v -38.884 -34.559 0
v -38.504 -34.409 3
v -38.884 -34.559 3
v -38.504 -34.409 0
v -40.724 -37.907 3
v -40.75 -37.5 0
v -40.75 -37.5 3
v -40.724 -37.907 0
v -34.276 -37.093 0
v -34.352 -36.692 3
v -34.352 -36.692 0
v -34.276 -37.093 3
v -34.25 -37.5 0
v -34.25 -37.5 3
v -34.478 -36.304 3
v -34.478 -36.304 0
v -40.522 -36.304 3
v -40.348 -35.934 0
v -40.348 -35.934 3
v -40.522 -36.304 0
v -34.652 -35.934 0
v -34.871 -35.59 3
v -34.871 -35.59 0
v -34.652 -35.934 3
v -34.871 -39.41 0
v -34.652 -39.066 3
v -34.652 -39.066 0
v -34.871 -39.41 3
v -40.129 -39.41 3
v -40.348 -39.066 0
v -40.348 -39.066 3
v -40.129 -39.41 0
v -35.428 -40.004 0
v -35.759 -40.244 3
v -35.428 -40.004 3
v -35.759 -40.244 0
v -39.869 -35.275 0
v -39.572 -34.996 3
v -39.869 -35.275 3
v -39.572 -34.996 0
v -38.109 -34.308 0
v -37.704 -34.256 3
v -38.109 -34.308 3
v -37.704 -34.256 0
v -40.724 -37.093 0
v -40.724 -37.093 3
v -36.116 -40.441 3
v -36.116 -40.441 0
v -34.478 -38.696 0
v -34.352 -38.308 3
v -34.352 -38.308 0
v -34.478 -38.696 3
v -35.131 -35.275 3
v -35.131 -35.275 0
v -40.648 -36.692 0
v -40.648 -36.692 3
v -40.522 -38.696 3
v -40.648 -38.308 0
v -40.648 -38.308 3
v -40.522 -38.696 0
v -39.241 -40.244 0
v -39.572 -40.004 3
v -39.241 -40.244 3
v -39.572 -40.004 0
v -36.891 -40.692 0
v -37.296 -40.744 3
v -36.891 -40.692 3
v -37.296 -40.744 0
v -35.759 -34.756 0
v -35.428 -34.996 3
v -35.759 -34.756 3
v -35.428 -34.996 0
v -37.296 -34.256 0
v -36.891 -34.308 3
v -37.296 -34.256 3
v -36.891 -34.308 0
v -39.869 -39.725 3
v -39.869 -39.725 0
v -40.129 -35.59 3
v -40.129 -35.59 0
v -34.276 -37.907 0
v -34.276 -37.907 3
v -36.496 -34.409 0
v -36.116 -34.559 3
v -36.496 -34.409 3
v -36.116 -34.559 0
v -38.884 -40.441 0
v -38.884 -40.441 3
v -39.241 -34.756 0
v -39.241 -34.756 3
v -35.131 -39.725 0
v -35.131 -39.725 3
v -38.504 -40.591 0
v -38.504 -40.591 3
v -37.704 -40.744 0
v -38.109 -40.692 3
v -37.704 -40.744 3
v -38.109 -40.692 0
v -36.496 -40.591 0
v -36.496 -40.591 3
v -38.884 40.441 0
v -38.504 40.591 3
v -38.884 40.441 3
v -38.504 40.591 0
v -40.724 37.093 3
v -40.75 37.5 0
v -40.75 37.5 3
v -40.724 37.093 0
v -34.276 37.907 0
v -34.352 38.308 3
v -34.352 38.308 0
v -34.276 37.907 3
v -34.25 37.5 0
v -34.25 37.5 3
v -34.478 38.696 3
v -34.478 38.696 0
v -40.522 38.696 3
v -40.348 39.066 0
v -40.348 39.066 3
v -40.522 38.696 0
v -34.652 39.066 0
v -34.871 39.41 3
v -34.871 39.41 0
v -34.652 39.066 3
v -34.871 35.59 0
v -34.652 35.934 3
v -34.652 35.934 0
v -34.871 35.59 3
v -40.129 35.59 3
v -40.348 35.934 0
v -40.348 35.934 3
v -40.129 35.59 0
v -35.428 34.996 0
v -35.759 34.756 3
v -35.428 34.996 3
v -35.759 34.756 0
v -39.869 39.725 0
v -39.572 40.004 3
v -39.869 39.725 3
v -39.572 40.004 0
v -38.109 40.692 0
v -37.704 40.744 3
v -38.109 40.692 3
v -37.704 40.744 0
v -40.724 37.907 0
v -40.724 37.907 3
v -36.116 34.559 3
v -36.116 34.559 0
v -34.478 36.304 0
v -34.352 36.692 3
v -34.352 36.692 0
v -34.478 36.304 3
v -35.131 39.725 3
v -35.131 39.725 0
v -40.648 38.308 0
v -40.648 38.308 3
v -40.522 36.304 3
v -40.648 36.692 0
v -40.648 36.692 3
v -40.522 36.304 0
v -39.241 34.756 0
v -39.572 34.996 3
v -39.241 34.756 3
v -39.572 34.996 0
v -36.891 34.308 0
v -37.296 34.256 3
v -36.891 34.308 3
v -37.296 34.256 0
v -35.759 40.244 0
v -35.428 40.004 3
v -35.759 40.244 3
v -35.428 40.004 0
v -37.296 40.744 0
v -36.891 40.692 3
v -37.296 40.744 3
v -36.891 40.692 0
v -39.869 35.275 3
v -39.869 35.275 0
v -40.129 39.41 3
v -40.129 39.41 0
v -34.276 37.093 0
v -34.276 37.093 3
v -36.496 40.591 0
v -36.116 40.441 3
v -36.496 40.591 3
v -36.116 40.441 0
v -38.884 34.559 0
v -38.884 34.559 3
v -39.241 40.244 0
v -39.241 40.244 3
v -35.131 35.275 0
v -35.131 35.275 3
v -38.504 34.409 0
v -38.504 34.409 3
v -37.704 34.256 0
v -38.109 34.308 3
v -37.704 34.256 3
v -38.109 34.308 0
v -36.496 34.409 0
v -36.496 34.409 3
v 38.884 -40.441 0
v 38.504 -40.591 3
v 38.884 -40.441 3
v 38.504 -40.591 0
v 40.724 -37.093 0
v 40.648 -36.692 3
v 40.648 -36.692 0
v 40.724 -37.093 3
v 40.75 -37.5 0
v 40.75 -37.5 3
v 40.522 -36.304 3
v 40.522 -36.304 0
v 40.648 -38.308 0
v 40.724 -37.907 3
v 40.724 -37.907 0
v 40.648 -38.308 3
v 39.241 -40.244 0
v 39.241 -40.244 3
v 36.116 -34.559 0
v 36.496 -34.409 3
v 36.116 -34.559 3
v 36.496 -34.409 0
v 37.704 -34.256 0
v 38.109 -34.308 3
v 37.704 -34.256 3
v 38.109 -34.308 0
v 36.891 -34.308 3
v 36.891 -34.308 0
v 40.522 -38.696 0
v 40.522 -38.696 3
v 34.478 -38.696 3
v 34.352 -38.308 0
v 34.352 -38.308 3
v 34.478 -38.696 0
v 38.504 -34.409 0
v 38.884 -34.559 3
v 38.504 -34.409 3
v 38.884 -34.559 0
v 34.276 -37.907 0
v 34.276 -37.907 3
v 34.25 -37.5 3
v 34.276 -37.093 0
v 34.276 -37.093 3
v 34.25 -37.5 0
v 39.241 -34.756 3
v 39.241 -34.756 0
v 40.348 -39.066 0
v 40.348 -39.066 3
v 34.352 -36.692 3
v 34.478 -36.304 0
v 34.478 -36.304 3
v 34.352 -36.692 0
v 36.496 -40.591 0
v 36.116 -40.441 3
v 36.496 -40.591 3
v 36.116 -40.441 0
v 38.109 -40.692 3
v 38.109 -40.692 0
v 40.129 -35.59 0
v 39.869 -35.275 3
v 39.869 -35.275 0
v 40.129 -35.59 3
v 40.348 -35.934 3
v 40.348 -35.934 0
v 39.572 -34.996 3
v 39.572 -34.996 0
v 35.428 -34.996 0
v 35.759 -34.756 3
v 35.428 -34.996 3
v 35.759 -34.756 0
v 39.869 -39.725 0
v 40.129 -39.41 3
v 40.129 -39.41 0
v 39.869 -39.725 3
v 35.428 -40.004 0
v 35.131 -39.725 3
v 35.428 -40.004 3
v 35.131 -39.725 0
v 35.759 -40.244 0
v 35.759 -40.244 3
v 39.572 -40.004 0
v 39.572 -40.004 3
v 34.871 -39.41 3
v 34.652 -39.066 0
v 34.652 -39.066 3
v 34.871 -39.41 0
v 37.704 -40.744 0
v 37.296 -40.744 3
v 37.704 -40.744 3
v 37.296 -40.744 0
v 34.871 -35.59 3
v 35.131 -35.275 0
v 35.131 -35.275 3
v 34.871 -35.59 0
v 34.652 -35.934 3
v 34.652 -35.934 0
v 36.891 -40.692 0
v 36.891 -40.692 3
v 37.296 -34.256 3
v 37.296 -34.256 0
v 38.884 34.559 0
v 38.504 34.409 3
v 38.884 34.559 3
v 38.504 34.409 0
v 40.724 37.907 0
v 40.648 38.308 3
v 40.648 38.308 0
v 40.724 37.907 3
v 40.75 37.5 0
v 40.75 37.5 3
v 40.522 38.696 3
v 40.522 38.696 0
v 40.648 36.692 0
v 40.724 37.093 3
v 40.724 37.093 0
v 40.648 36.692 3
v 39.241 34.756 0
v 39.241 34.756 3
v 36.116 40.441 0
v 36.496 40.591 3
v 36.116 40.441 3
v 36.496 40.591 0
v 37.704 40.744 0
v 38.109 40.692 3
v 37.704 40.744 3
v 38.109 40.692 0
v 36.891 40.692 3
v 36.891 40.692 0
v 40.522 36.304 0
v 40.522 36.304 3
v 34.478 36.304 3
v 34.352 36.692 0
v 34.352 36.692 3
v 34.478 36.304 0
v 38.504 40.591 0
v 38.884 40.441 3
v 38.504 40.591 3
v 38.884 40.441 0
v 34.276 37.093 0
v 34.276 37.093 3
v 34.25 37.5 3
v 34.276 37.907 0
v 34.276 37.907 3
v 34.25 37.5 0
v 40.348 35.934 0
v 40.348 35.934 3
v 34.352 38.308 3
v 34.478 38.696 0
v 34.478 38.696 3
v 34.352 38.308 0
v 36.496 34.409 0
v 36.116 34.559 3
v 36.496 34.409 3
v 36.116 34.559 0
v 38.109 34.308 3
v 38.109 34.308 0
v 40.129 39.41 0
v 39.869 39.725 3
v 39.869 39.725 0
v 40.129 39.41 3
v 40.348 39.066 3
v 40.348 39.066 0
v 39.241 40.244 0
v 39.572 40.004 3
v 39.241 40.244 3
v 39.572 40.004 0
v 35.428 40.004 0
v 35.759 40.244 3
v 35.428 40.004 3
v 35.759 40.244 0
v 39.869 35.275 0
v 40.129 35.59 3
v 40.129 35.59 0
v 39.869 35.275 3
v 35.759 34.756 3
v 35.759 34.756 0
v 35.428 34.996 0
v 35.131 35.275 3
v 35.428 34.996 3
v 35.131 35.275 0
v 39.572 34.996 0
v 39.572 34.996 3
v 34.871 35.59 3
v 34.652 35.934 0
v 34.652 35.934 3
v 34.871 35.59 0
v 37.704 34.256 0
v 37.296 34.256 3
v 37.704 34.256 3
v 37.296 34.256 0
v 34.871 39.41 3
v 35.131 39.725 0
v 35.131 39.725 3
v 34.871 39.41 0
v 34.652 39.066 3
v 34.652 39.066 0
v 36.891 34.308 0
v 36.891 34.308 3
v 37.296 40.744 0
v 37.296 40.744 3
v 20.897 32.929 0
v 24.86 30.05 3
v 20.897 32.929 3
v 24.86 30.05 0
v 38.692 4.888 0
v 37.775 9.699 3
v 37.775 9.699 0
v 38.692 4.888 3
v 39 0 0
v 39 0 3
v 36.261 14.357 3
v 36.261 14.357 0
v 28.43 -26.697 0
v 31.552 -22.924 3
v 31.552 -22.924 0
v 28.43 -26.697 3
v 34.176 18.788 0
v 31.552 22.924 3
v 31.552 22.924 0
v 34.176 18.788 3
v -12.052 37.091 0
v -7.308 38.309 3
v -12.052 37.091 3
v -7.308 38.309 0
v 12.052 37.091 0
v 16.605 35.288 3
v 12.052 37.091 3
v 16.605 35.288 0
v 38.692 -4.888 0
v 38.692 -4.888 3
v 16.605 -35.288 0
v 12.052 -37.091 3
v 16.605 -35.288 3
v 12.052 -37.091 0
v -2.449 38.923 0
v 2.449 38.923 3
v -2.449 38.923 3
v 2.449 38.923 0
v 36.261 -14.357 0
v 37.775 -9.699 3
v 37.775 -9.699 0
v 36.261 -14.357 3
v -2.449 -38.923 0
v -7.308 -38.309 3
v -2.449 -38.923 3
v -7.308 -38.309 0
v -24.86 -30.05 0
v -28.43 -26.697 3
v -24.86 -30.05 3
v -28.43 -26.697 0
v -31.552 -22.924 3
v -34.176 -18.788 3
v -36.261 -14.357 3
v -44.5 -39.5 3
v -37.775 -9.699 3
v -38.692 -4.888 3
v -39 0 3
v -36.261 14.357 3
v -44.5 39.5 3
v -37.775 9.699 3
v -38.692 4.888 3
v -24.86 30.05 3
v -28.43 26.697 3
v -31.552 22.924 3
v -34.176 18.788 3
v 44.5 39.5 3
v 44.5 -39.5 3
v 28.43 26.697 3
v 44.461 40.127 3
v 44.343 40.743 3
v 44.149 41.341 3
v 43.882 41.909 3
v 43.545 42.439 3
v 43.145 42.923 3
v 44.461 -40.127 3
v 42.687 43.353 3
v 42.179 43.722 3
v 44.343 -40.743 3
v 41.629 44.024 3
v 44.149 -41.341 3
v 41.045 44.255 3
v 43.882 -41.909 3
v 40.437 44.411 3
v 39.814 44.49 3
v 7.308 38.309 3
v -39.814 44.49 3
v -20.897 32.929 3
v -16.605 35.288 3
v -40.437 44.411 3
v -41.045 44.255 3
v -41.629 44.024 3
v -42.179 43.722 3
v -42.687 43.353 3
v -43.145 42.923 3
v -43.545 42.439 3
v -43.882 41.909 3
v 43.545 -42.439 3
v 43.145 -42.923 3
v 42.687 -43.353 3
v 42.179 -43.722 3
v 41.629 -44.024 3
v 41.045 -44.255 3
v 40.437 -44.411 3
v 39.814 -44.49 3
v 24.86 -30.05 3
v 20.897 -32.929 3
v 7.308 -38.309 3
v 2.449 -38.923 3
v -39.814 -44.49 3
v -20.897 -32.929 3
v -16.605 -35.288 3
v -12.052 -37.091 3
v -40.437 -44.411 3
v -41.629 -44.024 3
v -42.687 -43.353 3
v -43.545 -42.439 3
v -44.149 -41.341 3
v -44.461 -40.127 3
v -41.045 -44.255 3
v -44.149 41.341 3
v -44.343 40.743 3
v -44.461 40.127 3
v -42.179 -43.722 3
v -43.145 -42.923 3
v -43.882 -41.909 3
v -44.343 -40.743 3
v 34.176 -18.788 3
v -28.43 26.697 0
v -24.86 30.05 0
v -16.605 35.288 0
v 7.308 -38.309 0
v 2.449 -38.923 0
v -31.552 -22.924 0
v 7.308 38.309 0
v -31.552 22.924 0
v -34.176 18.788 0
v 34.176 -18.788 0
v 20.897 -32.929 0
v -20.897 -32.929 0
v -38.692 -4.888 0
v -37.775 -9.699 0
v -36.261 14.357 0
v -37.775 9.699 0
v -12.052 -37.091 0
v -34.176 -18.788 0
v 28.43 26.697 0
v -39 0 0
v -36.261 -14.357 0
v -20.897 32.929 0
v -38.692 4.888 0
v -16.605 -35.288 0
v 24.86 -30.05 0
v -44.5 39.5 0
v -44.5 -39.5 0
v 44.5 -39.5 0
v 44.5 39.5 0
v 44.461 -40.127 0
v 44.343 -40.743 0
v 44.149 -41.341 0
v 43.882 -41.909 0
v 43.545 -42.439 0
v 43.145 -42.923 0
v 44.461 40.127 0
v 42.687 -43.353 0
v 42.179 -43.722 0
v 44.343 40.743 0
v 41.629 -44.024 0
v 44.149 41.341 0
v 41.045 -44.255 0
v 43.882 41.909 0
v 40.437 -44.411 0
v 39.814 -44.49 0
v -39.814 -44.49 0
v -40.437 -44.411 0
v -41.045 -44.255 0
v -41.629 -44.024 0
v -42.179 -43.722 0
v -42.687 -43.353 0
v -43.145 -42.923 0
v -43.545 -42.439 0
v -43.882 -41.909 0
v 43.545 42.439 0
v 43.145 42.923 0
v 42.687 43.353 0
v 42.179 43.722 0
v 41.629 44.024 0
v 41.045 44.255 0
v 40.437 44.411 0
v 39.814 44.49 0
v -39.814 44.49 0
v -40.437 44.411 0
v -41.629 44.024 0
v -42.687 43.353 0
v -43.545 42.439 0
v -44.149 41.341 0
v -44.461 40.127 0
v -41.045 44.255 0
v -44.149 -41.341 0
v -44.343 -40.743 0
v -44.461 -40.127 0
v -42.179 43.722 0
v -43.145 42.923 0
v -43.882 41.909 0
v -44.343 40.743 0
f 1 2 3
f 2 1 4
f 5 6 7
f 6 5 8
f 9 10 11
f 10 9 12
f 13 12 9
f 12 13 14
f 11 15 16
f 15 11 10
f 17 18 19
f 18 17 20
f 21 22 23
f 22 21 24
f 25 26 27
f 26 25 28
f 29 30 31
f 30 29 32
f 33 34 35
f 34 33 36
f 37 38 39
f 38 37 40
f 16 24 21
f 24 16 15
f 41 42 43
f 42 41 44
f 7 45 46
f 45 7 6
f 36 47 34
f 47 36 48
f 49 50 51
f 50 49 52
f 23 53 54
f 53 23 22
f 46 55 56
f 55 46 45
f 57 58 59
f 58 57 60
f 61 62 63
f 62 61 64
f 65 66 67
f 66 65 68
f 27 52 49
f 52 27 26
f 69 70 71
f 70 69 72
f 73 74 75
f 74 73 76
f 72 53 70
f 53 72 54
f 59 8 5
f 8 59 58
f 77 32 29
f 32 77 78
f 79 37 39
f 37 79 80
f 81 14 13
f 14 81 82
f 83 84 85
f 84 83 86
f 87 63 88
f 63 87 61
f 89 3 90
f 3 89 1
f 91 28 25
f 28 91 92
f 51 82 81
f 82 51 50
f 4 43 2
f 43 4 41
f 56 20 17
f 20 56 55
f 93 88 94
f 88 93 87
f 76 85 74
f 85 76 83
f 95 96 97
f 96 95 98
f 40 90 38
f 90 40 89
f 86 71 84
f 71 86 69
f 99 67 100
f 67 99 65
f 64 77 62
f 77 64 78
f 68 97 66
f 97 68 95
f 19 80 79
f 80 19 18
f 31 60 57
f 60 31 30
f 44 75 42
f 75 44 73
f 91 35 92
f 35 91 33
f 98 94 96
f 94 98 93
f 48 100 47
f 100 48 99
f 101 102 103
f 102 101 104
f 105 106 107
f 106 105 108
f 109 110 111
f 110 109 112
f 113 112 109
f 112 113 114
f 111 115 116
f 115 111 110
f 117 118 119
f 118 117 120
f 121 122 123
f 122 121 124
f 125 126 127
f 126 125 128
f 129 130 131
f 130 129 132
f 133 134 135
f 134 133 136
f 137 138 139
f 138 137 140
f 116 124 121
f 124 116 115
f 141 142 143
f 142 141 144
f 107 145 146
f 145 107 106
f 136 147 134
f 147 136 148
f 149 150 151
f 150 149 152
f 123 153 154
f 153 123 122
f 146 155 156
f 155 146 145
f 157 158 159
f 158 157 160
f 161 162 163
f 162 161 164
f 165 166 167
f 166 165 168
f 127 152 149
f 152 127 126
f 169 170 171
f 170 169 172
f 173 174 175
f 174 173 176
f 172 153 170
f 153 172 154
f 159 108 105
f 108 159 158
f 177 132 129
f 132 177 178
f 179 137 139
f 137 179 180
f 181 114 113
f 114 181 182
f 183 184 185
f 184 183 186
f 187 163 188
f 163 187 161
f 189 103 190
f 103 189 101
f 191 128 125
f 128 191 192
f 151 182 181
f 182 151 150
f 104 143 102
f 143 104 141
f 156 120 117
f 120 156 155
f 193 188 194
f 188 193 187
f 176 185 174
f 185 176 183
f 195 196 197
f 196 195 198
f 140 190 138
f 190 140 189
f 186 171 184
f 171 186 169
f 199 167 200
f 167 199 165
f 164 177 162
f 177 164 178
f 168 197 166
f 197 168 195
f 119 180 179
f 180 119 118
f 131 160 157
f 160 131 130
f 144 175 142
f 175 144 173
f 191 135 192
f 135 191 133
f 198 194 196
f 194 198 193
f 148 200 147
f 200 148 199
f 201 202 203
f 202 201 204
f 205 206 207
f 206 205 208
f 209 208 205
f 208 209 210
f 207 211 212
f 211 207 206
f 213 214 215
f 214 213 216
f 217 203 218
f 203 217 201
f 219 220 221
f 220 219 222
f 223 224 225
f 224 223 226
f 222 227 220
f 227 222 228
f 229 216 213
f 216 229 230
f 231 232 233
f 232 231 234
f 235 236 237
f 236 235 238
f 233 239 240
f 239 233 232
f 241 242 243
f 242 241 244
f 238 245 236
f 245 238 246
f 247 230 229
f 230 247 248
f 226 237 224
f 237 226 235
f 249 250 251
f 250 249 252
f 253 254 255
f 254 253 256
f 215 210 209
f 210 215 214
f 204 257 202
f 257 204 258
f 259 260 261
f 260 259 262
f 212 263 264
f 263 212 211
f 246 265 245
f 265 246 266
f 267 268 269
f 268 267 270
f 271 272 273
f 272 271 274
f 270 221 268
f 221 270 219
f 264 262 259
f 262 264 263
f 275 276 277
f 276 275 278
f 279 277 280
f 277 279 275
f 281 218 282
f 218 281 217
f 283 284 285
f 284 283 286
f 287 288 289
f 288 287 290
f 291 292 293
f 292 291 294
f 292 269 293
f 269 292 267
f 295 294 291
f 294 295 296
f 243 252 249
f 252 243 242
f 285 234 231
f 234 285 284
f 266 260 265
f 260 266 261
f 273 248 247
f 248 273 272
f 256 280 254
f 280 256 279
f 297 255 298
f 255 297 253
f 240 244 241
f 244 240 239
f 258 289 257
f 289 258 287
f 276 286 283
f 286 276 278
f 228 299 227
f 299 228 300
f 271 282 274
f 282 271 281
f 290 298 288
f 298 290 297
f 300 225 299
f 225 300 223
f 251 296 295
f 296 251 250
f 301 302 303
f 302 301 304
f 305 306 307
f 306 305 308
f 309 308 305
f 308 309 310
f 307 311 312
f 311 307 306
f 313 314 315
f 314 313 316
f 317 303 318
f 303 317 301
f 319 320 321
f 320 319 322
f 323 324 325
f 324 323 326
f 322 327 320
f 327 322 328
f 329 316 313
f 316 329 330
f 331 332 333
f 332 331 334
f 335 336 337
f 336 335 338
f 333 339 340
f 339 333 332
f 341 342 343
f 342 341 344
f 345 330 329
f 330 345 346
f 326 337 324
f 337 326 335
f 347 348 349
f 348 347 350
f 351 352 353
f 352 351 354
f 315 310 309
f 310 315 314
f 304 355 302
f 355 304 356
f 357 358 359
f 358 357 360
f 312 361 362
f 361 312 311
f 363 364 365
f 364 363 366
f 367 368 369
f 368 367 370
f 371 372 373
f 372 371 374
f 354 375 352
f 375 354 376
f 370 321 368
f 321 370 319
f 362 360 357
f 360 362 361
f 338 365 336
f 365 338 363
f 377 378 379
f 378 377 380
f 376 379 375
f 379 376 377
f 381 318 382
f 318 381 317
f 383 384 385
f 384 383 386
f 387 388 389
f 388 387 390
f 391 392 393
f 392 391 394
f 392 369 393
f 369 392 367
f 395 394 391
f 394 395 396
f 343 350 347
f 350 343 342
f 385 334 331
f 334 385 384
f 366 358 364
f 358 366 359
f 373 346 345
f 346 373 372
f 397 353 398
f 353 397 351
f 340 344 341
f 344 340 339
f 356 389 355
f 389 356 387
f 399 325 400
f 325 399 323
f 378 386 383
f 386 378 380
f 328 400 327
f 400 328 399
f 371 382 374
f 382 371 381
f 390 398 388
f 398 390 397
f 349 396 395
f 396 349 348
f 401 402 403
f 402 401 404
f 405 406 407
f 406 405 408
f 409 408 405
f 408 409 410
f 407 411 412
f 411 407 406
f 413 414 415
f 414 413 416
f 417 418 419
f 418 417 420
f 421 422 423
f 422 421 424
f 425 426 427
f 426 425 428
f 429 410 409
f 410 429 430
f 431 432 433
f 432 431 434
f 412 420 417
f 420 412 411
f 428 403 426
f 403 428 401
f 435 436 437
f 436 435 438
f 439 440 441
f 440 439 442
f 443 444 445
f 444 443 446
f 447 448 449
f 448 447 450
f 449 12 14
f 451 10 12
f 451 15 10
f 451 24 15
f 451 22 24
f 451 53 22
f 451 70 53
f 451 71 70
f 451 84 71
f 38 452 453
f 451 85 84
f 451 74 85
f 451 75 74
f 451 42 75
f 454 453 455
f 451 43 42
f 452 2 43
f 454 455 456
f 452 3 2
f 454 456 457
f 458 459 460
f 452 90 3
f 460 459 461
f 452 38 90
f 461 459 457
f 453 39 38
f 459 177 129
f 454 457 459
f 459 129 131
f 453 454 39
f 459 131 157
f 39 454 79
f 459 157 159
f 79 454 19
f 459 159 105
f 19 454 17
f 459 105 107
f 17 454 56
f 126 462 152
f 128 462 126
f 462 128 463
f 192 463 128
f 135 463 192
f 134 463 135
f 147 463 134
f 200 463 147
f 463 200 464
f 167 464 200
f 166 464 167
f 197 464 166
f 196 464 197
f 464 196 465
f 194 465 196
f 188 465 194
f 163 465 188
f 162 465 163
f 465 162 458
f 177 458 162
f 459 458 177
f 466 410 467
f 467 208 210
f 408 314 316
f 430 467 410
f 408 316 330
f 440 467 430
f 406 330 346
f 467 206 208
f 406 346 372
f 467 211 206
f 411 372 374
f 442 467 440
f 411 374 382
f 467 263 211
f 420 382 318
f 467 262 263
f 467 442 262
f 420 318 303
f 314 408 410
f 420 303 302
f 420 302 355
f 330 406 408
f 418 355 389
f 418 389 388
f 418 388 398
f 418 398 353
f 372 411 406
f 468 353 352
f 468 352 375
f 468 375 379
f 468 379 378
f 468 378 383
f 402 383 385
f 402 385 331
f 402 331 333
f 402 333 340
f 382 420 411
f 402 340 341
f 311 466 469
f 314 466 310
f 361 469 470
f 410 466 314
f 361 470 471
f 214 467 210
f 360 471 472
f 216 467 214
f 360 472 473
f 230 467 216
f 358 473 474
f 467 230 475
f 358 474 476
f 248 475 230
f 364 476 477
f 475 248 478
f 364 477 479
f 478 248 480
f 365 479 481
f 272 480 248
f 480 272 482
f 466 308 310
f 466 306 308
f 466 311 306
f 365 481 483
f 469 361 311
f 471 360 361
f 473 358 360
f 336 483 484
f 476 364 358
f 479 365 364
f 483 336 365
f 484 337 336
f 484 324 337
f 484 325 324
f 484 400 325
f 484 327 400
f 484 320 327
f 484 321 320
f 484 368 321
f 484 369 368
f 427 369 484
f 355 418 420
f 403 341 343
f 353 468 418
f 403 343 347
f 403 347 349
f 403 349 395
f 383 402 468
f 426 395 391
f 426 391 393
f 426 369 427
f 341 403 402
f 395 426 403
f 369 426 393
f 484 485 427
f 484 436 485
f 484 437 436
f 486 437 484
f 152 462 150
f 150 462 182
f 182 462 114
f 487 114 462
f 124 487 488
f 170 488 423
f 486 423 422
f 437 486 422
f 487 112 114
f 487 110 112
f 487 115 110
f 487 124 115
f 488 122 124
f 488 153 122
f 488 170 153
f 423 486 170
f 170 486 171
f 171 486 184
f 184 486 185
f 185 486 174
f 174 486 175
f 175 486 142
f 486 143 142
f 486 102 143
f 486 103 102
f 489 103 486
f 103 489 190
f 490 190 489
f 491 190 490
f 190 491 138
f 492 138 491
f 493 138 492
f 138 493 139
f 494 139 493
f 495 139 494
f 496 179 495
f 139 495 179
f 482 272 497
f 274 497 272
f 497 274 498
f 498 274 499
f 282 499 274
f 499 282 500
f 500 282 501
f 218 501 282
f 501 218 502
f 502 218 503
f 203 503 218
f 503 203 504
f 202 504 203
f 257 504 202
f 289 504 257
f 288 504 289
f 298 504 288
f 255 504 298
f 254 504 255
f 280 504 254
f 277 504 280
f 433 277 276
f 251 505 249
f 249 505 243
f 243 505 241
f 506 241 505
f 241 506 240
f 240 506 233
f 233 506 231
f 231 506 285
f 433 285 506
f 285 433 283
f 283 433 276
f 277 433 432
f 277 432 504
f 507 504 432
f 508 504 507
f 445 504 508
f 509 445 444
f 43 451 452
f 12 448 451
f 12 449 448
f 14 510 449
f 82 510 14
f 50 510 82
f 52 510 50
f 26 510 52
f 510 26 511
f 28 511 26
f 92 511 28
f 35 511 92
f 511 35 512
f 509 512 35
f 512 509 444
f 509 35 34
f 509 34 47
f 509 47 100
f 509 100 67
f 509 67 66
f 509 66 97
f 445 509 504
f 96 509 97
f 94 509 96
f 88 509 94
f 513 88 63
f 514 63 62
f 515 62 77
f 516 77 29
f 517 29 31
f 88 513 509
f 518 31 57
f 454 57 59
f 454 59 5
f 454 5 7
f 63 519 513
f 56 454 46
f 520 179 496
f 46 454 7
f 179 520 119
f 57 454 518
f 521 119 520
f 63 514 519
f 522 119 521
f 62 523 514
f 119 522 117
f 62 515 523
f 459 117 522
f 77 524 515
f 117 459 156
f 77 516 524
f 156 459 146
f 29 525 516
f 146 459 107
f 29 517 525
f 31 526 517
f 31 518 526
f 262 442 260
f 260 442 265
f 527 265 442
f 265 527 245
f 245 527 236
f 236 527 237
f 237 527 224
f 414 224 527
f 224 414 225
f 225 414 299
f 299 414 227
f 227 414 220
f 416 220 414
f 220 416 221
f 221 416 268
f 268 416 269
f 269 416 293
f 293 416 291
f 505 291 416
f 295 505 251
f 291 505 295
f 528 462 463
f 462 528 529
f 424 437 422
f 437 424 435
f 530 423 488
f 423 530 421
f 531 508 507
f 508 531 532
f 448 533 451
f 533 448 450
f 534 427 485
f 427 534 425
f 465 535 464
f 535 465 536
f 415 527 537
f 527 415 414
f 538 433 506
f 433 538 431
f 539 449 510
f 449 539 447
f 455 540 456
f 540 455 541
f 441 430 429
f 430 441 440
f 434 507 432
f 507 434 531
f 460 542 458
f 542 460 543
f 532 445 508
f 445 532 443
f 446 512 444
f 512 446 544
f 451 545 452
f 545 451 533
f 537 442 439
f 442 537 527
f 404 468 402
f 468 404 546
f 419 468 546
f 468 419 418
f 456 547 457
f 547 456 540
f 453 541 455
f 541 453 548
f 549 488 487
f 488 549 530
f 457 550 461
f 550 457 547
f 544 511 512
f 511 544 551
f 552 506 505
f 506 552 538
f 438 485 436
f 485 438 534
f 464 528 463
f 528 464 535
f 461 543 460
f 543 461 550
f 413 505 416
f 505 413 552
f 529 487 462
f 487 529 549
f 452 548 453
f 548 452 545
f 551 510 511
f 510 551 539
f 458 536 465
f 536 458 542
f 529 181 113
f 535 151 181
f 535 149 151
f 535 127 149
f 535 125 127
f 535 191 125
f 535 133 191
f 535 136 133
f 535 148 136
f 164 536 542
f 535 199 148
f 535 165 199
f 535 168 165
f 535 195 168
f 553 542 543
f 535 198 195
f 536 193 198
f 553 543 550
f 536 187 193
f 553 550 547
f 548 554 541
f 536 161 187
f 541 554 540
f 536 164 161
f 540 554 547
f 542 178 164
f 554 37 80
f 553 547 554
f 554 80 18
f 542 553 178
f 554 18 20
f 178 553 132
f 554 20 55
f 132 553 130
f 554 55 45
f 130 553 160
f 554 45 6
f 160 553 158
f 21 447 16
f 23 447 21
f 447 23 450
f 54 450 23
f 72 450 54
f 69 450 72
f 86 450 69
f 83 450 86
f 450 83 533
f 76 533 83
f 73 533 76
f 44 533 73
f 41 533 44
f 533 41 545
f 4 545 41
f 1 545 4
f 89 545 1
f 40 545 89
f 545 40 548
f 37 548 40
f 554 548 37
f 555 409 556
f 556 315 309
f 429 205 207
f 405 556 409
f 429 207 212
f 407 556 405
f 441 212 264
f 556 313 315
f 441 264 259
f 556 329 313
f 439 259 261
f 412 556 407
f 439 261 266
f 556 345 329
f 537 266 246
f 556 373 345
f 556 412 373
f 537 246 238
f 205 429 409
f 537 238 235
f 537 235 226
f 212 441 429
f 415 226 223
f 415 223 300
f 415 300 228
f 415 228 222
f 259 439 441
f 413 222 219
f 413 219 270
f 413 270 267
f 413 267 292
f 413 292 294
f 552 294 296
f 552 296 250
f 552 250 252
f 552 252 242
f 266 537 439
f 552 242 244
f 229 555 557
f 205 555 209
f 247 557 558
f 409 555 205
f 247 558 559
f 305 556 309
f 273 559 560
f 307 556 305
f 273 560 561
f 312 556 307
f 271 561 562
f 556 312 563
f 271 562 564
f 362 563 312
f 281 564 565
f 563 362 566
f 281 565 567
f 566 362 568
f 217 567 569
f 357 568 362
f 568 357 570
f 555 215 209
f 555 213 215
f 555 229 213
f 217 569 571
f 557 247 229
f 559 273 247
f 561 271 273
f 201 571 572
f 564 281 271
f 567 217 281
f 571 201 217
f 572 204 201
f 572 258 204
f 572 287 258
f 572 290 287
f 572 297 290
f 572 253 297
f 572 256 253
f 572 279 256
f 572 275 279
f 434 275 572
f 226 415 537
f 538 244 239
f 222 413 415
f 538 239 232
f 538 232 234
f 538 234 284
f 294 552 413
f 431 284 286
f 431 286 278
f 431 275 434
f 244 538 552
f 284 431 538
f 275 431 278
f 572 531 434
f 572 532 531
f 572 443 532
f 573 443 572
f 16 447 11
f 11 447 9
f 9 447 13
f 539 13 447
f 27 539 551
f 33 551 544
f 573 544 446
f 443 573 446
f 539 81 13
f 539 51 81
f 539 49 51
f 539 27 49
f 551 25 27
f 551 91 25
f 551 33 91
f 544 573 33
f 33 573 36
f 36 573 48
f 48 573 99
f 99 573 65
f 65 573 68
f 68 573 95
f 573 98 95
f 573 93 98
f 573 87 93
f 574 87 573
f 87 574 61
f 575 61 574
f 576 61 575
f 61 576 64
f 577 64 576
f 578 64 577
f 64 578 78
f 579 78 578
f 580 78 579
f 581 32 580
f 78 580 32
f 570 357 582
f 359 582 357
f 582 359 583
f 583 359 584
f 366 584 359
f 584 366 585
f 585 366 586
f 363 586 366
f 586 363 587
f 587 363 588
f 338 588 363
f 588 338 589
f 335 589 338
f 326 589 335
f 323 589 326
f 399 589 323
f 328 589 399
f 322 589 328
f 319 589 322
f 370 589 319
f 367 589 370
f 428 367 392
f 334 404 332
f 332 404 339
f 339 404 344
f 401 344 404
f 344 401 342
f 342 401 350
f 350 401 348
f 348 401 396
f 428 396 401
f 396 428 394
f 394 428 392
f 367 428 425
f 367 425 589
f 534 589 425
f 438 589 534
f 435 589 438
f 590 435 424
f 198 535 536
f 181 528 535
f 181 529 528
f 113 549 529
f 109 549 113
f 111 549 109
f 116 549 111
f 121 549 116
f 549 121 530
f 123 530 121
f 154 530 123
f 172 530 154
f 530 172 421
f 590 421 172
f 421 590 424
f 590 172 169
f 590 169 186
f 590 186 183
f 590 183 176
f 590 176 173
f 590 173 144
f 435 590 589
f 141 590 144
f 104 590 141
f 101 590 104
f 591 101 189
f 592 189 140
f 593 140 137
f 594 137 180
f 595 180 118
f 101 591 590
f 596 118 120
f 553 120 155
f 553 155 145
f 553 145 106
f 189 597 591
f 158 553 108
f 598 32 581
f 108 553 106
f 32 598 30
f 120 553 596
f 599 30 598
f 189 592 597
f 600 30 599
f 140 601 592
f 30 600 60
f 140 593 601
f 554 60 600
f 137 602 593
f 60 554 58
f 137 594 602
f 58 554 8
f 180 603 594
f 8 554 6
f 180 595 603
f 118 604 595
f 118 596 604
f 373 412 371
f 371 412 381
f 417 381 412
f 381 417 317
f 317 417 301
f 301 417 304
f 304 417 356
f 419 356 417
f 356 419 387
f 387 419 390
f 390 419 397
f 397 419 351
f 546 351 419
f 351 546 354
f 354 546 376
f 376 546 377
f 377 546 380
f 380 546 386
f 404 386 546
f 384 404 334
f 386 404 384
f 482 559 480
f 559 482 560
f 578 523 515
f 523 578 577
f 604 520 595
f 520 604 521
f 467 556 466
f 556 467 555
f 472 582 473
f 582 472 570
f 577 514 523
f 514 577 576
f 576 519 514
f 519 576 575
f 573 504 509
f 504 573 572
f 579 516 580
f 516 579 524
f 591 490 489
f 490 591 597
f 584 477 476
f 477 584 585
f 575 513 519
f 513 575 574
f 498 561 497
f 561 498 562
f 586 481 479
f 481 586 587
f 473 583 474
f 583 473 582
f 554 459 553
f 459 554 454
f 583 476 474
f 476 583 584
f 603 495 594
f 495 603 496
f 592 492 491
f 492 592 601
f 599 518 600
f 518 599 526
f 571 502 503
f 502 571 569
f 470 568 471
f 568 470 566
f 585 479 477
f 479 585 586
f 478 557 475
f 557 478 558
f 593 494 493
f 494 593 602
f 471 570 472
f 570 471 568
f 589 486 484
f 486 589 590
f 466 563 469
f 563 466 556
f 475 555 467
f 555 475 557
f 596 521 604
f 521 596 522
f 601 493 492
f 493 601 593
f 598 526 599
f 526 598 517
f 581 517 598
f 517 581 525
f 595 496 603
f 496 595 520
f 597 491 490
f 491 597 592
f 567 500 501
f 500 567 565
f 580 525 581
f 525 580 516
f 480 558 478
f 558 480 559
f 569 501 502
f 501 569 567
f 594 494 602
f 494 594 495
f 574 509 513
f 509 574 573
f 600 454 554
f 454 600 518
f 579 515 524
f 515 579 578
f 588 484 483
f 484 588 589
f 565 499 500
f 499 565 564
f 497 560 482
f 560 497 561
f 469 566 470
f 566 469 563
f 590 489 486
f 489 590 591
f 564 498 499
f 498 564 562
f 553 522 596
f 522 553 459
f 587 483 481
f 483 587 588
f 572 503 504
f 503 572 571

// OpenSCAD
$fn = 50;


difference() {
	union() {
		hull() {
			translate(v = [-39.5000000000, 39.5000000000, 0]) {
				cylinder(h = 3, r = 5);
			}
			translate(v = [39.5000000000, 39.5000000000, 0]) {
				cylinder(h = 3, r = 5);
			}
			translate(v = [-39.5000000000, -39.5000000000, 0]) {
				cylinder(h = 3, r = 5);
			}
			translate(v = [39.5000000000, -39.5000000000, 0]) {
				cylinder(h = 3, r = 5);
			}
		}
	}
	union() {
		#translate(v = [-37.5000000000, -37.5000000000, -100.0000000000]) {
			cylinder(h = 200, r = 3.2500000000);
		}
		#translate(v = [-37.5000000000, 37.5000000000, -100.0000000000]) {
			cylinder(h = 200, r = 3.2500000000);
		}
		#translate(v = [37.5000000000, -37.5000000000, -100.0000000000]) {
			cylinder(h = 200, r = 3.2500000000);
		}
		#translate(v = [37.5000000000, 37.5000000000, -100.0000000000]) {
			cylinder(h = 200, r = 3.2500000000);
		}
		#cylinder(h = 3, r = 39.0000000000);
	}
}
